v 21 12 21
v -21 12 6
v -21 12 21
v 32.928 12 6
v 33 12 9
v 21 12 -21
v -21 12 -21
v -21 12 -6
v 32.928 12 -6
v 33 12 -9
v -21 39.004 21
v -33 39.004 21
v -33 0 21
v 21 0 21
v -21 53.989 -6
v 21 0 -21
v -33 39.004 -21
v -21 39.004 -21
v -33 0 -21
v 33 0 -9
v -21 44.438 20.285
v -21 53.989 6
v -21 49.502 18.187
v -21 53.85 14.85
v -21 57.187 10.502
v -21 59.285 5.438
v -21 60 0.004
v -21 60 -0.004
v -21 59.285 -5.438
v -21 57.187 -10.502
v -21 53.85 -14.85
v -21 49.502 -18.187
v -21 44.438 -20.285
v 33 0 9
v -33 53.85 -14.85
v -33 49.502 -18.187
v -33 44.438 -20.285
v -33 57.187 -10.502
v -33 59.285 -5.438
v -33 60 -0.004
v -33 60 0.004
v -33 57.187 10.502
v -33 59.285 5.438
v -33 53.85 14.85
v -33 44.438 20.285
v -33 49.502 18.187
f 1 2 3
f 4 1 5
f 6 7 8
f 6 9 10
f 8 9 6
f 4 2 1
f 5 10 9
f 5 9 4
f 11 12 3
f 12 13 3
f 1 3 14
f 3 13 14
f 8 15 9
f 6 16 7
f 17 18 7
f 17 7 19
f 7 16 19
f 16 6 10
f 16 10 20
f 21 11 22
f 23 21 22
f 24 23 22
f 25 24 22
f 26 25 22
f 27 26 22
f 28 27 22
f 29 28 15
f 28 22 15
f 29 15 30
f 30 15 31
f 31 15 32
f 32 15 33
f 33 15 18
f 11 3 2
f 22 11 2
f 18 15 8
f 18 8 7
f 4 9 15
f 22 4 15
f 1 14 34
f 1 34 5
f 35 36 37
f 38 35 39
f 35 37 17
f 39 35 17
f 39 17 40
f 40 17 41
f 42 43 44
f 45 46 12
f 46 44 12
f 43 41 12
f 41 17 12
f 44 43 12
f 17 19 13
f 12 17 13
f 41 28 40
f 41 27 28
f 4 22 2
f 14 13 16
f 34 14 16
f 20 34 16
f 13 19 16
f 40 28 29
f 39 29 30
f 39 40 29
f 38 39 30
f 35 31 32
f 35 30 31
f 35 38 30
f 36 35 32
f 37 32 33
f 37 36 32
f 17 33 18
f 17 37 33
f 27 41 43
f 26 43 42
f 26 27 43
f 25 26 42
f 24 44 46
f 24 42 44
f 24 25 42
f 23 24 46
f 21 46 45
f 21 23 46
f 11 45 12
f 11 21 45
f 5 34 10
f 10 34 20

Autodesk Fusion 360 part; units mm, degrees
sketch "Sketch1" plane through (0, 0, 0) normal (0, 1, 0) x (1, 0, 0)
  line L0 (33, 21) -> (-33, 21)
  line L1 (-33, 21) -> (-33, -21)
  line L2 (-33, -21) -> (33, -21)
  line L3 (33, -21) -> (33, 21)
  line L4 (33, 21) -> (-33, -21) construction
  line L5 (-33, 21) -> (33, -21) construction
  dimension "d1" = 66
extrude "Extrude1" add sketch "Sketch1" along normal blind 12
chamfer "Chamfer1" distance 12 angle 45 2 edges at (33, 6, 21) (33, 6, -21)
sketch "Sketch2" plane through (0, 12, 0) normal (0, 1, 0) x (-1, 0, 0)
  line L0 (-33, -9) -> (-21, -21)
  line L1 (-21, -21) -> (33, -21)
  line L2 (33, -21) -> (33, 21)
  line L3 (33, 21) -> (-21, 21)
  line L4 (-21, 21) -> (-33, 9)
  line L5 (-33, 9) -> (-33, -9)
  line L6 (33, 21) -> (21, 21)
  line L7 (21, 21) -> (21, -21)
  line L8 (21, -21) -> (33, -21)
  line L9 (33, -21) -> (33, 21)
  dimension "d6" = 12
extrude "Extrude2" add sketch "Sketch2" along normal blind 48 contours L1 L2 L3 L6 L7 L8 L9
fillet "Fillet1" radius 21 2 edges at (-27, 60, 21) (-27, 60, -21)
sketch "Sketch3" plane through (0, 0, 0) normal (0, 1, 0) x (1, 0, 0)
sketch "Sketch4" plane through (0, 0, 0) normal (0, 0, 1) x (1, 0, 0)
  line L0 (-21.0139, 54) -> (-21.0139, 12)
  line L1 (-21.0139, 12) -> (32.9285, 12)
  line L2 (32.9285, 12) -> (-21.0139, 54)
  dimension "d11" = 42
extrude "Extrude3" add sketch "Sketch4" along normal blind 6
extrude "Extrude4" add 1 faces at (-3.0238, 25.9964, 0) along direction (0, 0, -1) mid plane 12
sketch "Sketch5" plane through (0, 0, 0) normal (1, 0, 0) x (0, 0, -1)
equation "d7 = 60 mm - 12 mm"
